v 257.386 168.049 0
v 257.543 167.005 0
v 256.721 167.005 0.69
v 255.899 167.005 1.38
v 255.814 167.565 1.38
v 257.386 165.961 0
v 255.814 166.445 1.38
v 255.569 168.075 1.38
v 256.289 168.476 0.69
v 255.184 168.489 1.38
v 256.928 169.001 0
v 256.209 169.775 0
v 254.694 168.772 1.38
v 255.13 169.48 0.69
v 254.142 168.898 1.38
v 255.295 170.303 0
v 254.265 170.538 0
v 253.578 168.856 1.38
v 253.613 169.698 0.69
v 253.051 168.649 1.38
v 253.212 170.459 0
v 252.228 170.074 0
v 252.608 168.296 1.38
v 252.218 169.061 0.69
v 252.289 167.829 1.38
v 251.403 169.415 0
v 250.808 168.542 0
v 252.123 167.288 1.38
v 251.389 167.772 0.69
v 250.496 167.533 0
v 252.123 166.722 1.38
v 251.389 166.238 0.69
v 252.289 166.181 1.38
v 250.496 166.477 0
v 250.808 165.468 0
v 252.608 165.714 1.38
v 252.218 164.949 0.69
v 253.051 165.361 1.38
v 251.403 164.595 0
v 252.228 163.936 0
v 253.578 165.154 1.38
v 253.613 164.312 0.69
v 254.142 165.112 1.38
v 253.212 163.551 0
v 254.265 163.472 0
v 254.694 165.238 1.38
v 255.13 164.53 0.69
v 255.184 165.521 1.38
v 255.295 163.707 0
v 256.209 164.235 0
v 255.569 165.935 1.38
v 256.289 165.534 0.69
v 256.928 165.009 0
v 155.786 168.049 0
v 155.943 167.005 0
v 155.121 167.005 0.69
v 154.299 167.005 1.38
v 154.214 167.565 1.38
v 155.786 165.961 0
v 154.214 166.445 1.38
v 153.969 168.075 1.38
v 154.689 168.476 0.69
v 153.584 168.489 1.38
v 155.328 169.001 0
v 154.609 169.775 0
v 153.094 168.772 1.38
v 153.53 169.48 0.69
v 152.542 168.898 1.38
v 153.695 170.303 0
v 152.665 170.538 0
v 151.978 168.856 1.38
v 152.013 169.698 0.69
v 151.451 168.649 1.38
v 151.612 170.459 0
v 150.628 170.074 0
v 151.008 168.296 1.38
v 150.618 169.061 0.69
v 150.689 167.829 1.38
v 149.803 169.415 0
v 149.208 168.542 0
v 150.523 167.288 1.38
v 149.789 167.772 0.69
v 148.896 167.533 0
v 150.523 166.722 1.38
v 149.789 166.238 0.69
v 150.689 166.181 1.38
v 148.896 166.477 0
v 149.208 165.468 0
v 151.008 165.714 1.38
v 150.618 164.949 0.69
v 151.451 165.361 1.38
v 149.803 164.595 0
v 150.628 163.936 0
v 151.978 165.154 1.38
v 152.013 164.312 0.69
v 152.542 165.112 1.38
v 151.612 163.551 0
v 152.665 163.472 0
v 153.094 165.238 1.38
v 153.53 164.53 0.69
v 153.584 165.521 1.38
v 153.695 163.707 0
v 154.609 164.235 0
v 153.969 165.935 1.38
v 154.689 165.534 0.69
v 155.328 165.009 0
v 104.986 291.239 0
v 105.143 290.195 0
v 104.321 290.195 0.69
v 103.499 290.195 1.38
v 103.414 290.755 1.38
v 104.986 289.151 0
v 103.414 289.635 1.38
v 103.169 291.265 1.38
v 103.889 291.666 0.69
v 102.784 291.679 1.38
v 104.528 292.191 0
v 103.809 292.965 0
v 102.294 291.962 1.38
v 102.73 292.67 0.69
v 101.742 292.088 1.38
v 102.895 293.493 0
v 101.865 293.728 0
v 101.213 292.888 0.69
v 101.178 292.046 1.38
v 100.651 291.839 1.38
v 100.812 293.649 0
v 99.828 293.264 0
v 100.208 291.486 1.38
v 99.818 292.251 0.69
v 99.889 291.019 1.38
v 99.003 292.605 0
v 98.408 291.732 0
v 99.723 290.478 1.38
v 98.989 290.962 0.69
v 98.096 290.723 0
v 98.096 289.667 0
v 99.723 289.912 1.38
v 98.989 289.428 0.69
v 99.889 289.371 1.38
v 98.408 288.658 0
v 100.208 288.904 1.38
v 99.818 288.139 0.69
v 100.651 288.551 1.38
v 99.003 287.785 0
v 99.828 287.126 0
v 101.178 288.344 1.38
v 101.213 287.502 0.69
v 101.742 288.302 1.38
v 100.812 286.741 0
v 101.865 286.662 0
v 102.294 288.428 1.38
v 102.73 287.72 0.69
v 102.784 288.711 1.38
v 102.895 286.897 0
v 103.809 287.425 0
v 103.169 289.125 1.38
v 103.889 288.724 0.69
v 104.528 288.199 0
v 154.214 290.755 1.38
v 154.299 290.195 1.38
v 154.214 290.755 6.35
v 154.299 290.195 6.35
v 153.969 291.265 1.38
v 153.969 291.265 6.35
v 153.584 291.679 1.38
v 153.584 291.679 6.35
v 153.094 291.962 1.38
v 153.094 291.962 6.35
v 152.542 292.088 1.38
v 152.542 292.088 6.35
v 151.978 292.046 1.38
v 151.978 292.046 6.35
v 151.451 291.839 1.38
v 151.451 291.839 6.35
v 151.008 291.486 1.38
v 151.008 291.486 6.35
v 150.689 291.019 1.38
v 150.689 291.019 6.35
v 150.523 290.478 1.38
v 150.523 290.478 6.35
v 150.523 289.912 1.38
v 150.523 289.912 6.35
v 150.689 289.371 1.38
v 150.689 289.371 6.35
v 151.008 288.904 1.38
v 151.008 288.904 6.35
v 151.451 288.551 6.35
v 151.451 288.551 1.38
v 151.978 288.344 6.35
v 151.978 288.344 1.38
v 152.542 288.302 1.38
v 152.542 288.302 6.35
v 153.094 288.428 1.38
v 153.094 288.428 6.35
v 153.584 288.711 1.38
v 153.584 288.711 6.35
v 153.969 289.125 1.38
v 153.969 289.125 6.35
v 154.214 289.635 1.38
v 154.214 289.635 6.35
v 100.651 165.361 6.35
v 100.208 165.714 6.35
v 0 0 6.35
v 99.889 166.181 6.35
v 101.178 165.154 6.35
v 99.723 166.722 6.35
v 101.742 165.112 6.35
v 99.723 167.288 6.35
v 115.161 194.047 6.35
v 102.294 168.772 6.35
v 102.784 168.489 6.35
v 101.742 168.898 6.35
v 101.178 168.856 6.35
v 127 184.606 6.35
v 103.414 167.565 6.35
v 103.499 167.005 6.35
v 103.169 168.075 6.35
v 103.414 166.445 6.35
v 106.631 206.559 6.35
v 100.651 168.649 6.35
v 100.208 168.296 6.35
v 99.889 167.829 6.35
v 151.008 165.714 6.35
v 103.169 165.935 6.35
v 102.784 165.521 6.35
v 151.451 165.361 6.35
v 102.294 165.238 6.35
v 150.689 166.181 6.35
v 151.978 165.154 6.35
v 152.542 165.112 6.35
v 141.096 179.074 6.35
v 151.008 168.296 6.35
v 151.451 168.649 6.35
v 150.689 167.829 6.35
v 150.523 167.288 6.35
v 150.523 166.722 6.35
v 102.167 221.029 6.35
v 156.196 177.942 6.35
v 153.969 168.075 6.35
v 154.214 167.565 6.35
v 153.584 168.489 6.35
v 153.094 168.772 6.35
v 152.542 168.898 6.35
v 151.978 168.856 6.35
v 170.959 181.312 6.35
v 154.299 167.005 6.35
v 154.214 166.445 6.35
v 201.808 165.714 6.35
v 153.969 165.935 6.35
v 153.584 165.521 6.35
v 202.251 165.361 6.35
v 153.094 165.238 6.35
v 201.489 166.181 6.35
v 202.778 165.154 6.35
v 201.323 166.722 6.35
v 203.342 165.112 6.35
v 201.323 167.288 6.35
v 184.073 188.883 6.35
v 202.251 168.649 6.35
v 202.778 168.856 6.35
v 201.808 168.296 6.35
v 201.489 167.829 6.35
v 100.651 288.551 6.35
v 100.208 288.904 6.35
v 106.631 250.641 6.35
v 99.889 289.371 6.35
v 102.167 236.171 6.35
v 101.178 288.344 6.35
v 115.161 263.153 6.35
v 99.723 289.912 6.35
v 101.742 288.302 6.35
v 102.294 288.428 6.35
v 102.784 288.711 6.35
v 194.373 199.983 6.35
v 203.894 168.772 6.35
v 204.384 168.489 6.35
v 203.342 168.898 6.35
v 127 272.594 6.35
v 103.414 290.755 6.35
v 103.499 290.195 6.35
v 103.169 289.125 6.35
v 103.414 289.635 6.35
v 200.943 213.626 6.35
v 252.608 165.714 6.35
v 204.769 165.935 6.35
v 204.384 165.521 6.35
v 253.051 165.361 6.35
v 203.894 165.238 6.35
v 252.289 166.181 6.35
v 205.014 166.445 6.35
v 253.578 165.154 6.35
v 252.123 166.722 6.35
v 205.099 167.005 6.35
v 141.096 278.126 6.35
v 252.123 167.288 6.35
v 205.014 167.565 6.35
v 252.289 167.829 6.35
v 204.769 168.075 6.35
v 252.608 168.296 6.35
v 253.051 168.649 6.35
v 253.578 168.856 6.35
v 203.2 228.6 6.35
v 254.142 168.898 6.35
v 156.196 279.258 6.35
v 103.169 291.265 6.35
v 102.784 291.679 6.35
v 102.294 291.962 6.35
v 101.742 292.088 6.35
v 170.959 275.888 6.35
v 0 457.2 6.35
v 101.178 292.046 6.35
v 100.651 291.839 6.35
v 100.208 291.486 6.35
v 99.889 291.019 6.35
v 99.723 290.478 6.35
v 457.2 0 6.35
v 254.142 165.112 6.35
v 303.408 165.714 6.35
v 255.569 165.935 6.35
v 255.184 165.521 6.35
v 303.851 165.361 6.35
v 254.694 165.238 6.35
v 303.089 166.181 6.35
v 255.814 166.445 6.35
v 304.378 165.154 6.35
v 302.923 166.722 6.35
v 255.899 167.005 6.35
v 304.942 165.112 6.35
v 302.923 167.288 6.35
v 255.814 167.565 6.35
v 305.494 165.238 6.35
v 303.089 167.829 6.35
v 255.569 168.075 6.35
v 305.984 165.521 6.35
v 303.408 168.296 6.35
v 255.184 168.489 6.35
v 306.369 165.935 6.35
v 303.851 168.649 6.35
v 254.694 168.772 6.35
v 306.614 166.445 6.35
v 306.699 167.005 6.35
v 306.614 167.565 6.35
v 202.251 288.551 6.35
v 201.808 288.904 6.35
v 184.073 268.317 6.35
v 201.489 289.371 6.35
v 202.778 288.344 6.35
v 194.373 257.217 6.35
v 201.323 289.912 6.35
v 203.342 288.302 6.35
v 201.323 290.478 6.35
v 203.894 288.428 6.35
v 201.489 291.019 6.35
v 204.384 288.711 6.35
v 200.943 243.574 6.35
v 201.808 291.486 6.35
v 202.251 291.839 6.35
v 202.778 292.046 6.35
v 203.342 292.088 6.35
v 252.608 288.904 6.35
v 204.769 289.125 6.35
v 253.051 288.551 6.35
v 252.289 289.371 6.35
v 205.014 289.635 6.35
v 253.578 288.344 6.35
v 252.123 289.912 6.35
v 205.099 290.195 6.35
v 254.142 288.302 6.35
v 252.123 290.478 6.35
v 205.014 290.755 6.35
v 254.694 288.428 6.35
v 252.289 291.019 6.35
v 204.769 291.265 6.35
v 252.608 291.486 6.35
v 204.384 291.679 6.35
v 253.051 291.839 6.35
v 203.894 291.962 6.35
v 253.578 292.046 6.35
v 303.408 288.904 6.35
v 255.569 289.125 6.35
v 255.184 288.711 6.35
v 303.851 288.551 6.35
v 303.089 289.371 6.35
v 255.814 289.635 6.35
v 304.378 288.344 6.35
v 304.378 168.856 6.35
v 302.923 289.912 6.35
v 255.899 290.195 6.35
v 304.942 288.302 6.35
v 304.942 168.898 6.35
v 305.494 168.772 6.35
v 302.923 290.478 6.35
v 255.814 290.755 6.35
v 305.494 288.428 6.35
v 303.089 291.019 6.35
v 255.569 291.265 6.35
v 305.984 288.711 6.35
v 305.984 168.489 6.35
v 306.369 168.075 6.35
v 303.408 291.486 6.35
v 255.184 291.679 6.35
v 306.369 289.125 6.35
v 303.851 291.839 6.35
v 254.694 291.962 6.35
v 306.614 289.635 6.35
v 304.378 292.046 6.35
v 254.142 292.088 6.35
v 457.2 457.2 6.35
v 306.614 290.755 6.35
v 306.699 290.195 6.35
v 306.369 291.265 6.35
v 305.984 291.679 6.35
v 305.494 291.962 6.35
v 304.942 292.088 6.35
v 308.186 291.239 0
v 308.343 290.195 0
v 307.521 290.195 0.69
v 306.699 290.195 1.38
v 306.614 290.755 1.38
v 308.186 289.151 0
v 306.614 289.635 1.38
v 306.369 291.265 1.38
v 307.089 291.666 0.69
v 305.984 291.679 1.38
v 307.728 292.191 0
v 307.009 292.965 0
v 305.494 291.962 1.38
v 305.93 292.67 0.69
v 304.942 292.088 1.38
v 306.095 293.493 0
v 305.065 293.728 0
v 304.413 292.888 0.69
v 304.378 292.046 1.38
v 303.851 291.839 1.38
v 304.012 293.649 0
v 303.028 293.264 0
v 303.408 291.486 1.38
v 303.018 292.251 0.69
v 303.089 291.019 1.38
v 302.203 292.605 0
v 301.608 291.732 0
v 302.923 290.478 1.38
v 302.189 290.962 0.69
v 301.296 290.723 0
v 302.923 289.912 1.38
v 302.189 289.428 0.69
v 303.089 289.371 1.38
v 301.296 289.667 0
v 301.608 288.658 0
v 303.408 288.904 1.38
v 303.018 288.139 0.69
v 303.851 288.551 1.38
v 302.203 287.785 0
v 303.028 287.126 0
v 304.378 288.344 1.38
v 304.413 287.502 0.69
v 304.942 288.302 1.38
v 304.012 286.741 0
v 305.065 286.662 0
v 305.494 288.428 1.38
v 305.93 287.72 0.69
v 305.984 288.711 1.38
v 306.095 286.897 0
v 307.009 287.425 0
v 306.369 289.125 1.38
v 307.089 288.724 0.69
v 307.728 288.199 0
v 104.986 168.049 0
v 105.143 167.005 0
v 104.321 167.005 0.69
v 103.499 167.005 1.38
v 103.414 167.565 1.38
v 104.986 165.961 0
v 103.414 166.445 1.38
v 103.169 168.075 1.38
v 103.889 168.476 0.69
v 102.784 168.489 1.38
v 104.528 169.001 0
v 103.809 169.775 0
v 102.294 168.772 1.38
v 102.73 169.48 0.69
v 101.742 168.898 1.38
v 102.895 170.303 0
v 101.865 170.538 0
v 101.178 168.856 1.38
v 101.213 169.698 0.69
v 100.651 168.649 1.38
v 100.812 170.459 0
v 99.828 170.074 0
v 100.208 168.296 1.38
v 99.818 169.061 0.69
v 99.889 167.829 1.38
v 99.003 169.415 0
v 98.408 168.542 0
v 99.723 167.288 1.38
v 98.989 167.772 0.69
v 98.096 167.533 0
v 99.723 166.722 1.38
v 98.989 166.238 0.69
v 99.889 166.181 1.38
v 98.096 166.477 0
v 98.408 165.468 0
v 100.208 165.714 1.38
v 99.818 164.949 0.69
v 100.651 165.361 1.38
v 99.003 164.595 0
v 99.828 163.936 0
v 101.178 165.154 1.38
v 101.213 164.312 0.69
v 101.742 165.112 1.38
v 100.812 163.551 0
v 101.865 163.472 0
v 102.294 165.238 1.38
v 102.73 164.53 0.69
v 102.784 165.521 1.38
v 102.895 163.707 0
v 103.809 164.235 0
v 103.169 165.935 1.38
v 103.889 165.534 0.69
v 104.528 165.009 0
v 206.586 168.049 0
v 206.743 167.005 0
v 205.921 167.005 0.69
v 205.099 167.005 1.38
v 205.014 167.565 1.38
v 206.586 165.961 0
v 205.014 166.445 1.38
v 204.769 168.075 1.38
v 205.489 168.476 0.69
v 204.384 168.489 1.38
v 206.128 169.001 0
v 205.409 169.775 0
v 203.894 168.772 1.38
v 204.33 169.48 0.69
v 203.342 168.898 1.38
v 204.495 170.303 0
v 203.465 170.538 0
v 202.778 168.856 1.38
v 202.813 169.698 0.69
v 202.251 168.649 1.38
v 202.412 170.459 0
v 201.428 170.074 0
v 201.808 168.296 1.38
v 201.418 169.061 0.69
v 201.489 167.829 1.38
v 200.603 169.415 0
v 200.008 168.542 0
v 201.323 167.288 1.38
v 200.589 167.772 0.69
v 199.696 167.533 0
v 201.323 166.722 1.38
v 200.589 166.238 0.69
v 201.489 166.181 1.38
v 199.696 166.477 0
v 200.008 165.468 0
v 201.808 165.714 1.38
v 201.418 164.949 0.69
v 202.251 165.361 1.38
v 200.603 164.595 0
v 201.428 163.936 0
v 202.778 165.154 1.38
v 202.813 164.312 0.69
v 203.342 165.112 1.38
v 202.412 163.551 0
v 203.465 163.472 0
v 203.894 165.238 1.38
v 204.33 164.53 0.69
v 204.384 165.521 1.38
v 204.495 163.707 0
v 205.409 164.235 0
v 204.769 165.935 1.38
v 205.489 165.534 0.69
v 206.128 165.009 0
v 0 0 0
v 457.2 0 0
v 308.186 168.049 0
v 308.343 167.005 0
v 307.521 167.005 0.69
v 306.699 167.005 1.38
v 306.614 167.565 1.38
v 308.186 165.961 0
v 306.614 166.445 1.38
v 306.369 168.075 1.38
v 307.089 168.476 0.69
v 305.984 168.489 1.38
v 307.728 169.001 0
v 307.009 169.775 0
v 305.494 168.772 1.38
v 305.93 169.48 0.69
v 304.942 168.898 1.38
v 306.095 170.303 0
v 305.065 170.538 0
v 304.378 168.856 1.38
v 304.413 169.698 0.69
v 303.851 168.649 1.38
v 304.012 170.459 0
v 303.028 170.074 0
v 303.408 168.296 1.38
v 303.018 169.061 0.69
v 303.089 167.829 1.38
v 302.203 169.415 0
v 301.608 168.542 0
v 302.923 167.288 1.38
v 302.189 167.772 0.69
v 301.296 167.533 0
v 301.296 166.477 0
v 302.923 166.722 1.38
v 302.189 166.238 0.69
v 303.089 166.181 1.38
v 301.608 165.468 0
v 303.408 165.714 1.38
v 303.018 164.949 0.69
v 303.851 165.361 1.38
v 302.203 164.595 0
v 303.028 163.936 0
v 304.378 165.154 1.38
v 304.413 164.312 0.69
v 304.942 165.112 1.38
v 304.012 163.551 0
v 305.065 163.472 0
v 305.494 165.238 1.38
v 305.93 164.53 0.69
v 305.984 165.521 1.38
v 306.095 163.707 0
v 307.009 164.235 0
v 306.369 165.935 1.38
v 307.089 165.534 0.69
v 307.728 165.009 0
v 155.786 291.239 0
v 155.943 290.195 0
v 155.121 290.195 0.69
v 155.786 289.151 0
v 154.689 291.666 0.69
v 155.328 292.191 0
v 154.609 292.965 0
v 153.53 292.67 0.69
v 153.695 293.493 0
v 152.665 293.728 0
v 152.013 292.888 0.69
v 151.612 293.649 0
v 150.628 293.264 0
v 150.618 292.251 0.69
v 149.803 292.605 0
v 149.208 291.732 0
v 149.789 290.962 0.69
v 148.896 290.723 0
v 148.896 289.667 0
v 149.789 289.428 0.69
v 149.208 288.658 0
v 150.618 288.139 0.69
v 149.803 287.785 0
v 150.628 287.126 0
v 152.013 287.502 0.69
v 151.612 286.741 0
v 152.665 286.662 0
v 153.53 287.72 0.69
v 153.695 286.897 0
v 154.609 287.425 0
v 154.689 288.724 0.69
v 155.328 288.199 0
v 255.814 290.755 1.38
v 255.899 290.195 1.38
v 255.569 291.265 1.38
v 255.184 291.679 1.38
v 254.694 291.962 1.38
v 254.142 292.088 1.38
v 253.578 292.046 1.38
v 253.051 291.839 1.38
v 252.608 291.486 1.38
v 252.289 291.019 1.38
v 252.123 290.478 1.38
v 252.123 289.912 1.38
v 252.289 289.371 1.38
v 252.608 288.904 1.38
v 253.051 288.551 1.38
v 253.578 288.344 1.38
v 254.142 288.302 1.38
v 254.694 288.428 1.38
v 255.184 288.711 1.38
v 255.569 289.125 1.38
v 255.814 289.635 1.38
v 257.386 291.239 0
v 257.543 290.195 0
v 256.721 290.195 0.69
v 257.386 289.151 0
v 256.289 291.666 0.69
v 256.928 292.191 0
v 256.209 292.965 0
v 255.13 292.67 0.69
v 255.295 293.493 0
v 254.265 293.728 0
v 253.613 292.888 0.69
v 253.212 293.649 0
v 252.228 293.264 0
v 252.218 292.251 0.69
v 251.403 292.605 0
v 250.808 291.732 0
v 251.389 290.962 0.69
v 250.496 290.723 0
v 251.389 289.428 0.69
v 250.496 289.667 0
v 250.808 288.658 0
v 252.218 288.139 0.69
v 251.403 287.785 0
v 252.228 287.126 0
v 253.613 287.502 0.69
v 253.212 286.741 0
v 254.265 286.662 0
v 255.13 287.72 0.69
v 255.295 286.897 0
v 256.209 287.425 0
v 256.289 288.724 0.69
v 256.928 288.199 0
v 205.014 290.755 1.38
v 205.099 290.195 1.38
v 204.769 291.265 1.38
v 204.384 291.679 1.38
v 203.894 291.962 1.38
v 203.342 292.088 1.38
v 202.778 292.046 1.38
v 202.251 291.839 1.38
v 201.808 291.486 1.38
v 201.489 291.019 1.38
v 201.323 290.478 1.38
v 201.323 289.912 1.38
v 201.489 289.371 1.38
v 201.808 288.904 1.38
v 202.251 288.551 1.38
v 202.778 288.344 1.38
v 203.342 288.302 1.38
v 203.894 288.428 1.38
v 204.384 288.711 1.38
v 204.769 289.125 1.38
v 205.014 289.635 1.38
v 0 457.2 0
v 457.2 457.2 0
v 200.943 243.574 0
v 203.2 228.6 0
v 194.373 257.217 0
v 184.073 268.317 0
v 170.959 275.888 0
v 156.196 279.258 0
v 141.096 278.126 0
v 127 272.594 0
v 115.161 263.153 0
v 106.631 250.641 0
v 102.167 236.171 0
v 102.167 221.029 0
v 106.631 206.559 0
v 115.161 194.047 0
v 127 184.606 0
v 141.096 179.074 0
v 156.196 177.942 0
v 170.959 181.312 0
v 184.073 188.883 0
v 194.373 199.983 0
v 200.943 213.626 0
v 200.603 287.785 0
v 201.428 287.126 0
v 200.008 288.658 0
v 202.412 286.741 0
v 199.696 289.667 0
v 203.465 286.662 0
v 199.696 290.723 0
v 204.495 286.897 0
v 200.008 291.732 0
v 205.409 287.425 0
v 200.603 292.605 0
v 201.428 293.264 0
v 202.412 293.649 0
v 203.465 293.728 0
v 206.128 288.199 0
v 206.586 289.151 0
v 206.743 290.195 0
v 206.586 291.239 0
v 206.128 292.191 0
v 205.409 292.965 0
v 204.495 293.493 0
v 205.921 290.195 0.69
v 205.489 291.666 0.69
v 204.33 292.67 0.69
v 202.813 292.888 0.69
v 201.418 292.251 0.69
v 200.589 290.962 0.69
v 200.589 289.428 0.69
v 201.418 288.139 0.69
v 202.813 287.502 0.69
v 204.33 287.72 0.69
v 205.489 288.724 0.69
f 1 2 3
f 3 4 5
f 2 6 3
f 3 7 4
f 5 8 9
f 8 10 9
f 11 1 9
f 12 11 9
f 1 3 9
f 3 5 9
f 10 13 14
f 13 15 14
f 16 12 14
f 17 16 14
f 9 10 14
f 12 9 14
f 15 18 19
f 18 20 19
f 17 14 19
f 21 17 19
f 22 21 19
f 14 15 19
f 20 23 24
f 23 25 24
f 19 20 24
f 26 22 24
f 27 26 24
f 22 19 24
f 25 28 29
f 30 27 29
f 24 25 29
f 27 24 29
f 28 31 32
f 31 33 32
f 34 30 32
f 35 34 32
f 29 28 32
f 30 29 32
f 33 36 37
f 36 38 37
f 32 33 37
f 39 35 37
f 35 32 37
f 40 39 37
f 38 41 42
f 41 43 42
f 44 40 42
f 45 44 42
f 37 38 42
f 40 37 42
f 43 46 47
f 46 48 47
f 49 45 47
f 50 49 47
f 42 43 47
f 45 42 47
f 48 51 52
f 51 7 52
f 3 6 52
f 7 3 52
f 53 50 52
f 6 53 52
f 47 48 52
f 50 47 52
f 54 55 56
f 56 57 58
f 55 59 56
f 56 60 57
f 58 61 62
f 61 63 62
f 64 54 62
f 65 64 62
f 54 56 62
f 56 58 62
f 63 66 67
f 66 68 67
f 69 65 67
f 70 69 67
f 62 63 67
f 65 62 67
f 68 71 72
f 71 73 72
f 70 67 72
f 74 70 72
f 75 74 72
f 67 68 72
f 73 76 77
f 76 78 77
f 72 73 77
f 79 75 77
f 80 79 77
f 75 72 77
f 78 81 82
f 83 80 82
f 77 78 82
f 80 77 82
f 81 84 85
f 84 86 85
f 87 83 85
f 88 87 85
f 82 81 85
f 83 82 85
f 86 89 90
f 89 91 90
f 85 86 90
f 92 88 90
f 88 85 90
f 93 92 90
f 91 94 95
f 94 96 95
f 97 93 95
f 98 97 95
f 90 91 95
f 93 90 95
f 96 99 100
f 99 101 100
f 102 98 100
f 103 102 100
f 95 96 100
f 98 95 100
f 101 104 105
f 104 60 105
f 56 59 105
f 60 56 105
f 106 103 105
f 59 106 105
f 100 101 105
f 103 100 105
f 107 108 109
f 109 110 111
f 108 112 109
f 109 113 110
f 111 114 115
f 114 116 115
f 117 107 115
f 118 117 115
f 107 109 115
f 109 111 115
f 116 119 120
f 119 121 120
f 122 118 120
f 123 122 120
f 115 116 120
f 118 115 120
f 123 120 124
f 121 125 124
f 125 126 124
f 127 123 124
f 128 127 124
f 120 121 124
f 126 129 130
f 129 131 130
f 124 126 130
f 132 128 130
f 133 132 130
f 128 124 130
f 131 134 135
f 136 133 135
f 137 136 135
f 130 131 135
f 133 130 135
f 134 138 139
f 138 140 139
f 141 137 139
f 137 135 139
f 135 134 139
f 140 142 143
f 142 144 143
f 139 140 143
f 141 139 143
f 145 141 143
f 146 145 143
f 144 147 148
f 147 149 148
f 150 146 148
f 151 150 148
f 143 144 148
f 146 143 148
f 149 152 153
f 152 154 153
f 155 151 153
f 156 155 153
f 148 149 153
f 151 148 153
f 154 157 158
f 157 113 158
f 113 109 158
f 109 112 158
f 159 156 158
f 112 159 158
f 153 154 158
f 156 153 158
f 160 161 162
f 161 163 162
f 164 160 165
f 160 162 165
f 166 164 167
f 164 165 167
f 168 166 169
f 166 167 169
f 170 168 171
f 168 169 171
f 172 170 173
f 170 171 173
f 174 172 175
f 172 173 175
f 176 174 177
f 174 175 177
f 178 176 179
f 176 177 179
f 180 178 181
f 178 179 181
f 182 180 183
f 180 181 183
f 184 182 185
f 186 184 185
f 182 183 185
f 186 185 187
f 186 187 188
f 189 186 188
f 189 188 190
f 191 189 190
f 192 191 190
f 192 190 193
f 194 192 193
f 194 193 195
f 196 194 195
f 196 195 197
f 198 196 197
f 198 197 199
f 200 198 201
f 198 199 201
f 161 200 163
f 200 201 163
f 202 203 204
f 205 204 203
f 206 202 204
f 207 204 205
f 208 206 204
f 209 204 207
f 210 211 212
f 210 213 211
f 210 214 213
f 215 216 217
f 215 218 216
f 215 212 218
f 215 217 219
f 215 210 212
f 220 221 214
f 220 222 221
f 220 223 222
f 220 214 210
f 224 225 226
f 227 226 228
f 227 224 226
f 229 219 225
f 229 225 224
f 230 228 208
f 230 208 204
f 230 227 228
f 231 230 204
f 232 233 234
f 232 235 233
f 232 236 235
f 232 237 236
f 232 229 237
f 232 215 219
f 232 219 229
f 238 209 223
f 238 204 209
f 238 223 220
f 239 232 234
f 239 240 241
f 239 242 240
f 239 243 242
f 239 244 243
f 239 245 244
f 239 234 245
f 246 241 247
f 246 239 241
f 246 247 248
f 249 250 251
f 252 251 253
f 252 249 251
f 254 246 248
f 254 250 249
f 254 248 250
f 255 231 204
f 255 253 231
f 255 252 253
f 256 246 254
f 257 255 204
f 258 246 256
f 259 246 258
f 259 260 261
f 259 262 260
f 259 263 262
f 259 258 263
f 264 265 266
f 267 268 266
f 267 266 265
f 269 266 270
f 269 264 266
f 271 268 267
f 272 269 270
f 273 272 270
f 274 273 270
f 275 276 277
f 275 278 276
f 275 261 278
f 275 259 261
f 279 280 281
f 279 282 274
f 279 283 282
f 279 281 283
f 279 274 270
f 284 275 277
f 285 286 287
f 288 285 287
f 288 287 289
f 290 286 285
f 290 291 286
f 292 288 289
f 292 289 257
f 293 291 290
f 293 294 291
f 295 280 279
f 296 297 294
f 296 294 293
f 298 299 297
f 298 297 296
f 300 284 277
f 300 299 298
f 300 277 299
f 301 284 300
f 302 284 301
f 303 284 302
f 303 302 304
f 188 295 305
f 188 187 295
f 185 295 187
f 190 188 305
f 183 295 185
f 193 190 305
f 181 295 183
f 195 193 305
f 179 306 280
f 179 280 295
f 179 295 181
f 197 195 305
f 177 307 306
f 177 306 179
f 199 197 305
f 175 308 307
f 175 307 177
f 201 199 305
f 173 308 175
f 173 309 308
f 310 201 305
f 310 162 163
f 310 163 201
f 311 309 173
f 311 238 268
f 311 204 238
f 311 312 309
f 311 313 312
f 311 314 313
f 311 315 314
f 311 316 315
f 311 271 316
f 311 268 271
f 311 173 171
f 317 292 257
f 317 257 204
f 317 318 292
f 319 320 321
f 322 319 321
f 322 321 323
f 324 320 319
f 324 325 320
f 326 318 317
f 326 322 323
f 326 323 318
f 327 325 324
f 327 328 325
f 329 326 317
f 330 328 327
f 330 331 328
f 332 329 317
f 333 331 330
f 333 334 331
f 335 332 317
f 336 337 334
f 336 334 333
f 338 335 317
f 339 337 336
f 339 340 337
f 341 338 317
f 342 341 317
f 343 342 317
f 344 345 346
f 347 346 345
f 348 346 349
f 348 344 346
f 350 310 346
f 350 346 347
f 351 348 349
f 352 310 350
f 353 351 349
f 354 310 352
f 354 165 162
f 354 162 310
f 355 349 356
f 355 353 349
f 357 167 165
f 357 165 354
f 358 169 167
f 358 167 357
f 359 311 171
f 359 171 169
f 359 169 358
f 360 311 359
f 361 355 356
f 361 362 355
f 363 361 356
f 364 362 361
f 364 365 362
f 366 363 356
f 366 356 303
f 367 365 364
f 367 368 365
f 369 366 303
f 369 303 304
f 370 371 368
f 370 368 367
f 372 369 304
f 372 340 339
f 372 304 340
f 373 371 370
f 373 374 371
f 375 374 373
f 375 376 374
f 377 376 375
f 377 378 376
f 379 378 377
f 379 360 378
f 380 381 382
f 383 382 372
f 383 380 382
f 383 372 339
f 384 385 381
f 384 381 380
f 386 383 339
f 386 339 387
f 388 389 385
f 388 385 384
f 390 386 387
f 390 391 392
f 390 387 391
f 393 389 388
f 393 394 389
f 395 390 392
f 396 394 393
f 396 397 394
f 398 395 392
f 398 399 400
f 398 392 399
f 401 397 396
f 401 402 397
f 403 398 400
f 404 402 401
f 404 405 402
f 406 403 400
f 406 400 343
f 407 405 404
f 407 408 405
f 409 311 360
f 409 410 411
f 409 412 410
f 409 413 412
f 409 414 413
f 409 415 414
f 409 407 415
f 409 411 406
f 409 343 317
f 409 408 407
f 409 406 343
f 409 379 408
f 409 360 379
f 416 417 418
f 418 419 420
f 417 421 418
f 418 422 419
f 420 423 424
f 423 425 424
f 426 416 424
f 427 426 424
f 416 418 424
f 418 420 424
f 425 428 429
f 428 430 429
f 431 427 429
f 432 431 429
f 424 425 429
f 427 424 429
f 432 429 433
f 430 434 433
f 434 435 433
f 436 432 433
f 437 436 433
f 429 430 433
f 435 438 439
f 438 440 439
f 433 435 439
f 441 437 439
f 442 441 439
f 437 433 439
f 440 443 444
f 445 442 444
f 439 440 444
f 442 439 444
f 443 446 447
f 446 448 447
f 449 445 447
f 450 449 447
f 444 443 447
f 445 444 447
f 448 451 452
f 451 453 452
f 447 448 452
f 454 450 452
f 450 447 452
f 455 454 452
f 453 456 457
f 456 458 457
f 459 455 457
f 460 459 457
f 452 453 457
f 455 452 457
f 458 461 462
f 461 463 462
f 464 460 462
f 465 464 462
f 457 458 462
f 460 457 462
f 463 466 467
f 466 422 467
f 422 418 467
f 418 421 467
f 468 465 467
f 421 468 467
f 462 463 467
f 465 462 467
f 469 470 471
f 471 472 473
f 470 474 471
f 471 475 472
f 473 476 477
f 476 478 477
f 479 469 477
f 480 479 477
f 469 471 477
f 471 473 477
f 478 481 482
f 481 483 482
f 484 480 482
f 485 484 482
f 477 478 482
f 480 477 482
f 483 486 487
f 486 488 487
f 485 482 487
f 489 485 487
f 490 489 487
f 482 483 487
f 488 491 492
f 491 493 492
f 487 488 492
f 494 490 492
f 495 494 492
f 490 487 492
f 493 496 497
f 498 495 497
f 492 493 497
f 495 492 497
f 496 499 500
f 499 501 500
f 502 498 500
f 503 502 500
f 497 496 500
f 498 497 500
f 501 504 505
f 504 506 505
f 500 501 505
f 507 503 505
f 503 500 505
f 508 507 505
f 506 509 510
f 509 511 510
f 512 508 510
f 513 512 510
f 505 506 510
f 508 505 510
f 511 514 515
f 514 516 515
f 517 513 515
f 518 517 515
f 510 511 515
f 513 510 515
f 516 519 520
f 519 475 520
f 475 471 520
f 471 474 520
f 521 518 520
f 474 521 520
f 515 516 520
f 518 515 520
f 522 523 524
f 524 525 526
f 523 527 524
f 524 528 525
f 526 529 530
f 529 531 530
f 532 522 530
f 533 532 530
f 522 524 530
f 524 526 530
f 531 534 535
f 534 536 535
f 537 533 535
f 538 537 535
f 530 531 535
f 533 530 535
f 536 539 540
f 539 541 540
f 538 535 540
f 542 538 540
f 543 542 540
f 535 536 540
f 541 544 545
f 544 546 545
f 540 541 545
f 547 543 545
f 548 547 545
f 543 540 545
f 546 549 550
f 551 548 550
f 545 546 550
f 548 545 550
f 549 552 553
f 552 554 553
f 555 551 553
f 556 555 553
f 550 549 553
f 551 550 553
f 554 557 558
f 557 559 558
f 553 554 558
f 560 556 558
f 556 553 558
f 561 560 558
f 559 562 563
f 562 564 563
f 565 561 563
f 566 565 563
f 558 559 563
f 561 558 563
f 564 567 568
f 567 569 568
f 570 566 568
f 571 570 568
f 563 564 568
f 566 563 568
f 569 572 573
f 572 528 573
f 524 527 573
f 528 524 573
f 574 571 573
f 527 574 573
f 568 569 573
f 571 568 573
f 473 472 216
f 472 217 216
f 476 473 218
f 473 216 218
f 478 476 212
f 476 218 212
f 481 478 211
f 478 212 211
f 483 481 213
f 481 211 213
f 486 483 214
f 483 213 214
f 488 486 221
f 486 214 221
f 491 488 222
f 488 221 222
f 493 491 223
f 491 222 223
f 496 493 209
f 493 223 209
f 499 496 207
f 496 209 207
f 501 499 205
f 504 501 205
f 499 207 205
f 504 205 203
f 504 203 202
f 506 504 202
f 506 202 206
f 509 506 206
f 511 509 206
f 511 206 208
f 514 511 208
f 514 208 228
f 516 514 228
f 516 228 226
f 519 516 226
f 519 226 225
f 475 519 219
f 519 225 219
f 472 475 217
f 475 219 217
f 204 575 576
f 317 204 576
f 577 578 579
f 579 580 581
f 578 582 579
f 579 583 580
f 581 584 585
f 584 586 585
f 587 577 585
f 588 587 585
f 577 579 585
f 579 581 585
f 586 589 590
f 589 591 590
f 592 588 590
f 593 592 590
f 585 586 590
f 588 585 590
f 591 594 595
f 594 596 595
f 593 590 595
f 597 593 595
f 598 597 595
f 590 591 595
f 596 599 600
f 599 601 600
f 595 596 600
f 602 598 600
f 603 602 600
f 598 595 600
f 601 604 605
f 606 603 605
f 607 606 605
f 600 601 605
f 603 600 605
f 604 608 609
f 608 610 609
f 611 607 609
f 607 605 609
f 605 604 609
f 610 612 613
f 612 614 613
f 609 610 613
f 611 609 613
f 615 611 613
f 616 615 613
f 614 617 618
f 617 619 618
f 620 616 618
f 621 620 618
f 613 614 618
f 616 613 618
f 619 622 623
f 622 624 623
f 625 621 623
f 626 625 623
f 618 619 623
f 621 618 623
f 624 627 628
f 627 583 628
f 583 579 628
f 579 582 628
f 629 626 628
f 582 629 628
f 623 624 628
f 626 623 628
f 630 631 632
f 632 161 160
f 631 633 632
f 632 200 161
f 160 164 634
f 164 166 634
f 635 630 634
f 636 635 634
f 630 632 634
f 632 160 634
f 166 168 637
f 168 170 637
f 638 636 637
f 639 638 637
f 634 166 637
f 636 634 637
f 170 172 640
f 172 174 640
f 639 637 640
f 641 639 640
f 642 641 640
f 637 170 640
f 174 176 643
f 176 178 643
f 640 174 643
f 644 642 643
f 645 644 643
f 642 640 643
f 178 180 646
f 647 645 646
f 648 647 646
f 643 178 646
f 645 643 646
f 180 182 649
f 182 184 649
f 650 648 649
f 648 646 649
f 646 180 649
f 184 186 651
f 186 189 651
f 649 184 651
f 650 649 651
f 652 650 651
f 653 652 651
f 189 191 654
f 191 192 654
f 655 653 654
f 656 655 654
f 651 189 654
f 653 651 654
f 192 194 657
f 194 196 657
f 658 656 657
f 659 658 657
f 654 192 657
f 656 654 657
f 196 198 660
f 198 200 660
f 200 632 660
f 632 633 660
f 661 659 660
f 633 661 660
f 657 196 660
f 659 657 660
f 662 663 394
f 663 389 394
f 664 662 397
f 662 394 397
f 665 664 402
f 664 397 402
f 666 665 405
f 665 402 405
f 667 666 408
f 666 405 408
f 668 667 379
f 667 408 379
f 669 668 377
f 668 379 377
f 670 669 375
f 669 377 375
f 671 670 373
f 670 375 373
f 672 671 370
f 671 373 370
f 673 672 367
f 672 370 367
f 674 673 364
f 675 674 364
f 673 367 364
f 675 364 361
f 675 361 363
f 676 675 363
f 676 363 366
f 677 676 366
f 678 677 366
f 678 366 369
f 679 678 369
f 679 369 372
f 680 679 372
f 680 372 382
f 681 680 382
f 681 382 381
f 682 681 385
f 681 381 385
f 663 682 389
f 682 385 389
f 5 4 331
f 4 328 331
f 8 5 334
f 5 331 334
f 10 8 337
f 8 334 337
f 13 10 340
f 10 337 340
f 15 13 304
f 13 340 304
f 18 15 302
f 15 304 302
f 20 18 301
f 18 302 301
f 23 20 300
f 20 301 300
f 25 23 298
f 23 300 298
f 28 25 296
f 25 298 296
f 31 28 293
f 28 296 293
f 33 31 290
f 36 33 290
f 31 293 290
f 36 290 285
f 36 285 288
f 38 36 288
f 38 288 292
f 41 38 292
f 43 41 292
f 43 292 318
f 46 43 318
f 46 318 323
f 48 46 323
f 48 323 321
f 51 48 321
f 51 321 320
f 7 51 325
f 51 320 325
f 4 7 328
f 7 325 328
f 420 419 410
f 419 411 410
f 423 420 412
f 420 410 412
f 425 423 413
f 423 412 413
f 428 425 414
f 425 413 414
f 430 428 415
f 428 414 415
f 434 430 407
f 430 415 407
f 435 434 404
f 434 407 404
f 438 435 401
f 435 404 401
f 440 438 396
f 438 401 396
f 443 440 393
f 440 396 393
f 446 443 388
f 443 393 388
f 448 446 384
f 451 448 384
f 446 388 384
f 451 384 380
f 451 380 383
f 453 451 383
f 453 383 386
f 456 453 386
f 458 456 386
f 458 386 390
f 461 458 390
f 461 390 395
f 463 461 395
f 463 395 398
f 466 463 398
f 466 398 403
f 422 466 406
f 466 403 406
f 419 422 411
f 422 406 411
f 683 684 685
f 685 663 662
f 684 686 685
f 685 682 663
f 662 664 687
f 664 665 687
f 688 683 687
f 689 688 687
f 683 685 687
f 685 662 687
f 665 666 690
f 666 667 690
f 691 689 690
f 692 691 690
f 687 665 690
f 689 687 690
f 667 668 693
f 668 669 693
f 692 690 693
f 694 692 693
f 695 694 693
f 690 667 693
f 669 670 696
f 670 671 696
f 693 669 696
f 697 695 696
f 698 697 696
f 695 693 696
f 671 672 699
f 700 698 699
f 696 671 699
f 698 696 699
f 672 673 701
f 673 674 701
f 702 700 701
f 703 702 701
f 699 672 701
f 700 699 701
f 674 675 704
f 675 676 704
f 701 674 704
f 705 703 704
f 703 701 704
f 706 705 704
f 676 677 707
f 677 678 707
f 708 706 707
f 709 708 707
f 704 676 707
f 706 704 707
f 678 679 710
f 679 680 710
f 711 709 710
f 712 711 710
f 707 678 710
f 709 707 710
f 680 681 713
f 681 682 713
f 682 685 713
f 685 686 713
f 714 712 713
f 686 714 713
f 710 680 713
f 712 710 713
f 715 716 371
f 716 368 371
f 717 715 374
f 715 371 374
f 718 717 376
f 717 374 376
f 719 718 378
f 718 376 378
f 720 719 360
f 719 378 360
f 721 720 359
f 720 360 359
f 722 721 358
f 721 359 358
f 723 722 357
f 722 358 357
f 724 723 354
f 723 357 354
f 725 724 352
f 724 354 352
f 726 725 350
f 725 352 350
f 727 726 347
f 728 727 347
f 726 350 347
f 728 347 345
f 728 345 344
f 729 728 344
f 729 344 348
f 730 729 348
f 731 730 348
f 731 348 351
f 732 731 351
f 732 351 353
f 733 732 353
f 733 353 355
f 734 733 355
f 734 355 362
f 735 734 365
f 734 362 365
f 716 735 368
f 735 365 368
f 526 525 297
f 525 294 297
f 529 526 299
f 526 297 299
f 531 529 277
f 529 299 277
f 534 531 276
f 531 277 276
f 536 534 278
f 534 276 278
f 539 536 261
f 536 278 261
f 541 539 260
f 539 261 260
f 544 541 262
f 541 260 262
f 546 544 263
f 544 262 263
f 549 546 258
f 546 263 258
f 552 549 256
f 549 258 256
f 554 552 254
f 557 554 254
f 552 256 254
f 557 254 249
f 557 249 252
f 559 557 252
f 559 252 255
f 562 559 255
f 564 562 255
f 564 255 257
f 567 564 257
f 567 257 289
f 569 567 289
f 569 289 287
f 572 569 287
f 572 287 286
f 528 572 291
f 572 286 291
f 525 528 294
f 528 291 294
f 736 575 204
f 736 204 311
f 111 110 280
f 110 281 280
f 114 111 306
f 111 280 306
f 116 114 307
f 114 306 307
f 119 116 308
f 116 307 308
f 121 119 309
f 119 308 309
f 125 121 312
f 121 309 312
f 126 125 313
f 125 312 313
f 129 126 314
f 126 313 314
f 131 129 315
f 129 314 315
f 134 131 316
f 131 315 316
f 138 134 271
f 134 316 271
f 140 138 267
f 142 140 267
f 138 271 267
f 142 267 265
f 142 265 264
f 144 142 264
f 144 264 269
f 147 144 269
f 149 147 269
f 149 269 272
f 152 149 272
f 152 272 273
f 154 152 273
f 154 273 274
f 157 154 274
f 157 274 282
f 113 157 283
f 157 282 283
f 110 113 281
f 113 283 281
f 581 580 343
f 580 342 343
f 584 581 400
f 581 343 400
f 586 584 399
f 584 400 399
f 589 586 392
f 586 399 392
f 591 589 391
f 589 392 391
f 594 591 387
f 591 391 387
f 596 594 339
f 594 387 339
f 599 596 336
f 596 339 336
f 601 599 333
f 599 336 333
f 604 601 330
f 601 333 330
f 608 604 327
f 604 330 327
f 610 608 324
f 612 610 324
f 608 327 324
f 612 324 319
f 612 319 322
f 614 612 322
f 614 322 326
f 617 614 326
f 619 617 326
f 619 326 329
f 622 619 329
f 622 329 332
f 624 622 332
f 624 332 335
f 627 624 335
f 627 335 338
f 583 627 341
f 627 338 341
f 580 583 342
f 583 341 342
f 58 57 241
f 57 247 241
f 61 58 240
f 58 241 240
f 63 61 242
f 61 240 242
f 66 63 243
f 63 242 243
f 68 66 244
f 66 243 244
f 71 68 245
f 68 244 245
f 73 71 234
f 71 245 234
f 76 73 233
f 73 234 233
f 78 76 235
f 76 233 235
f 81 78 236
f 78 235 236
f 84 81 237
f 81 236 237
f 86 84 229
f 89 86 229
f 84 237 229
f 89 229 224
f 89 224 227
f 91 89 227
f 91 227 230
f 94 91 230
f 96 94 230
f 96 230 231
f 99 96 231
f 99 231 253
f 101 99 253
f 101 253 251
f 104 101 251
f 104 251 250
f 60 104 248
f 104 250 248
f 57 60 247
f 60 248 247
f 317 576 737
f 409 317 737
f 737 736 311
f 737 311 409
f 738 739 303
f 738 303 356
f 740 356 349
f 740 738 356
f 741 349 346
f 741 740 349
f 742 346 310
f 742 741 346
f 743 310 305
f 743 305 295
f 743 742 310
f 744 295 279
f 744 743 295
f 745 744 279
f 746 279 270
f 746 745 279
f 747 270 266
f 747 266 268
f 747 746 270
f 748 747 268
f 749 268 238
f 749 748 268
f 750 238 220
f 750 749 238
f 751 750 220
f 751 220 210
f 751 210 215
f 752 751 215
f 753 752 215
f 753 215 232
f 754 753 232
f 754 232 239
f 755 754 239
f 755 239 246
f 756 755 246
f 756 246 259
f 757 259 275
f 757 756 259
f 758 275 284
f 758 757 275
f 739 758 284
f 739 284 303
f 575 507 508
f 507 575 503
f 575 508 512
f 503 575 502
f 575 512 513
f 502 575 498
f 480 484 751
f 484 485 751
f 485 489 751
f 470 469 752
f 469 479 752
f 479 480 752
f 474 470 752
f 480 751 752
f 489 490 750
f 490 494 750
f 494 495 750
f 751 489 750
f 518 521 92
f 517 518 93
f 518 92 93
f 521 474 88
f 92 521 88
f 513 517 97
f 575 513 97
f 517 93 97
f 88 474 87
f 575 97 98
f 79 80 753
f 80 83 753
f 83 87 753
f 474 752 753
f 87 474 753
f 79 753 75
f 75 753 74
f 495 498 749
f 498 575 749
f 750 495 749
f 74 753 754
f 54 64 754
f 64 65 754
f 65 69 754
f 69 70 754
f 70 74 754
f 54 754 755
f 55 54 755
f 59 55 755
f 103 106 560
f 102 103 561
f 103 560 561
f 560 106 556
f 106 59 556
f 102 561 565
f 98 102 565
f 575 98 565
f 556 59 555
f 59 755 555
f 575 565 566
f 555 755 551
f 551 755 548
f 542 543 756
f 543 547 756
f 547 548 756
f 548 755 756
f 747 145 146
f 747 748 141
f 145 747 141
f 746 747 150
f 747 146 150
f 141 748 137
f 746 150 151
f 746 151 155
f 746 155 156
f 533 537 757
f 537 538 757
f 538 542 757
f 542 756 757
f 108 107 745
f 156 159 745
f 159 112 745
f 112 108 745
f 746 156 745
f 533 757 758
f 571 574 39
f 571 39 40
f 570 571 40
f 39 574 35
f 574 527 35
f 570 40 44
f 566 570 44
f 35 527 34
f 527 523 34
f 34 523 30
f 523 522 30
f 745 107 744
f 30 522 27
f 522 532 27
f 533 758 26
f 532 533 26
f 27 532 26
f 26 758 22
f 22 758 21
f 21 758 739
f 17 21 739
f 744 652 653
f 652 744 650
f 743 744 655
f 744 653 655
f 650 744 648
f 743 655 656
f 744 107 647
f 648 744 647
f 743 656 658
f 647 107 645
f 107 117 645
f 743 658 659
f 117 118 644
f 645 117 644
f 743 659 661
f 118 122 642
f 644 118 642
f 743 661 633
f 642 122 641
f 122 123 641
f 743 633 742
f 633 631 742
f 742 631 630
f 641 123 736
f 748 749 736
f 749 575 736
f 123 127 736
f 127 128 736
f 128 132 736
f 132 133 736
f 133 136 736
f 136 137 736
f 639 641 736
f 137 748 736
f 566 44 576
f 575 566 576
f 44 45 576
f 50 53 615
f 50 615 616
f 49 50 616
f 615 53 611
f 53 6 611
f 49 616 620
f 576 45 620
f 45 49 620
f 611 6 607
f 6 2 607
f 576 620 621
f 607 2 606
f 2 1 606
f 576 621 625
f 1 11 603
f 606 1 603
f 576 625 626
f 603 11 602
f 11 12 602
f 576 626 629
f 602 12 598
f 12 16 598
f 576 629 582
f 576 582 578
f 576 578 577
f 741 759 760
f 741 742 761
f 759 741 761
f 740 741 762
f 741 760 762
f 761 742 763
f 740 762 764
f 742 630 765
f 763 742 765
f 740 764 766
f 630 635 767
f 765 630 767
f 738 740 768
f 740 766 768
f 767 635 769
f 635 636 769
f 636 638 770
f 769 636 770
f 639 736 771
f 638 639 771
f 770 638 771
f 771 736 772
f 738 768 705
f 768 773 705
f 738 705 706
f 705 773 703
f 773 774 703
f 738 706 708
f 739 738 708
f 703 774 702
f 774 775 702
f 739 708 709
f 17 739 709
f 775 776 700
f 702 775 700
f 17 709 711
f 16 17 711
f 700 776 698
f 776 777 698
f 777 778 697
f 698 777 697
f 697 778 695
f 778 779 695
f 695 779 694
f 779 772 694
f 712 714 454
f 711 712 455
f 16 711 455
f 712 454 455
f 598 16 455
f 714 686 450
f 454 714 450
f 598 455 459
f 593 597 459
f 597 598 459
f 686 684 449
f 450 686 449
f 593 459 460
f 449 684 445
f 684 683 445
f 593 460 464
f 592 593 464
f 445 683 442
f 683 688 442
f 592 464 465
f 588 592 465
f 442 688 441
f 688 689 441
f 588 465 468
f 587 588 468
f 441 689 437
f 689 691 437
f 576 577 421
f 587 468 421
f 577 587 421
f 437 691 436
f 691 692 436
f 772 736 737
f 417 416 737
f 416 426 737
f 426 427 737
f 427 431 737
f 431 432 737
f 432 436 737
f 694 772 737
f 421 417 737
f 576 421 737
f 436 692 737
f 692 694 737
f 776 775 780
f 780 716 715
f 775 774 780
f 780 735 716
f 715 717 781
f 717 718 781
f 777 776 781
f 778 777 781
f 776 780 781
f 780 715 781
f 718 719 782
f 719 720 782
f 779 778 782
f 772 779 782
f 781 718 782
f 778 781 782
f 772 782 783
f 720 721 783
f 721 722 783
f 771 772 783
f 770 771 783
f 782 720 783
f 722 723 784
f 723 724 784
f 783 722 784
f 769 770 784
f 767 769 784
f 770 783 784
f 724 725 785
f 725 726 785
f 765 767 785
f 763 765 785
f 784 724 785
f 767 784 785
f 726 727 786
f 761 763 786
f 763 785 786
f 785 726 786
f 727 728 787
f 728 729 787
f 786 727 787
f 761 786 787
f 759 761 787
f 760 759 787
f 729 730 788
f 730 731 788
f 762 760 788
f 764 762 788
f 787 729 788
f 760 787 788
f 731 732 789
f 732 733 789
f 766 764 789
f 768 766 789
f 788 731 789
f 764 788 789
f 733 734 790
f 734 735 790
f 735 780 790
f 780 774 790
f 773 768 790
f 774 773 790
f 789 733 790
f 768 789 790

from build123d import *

# Parameters (mm, degrees)
SKETCH1_W                                         = 457.2
SKETCH1_H                                         = 457.2
SKETCH1_R                                         = 50.8
BOSS_EXTRUDE1_DEPTH                               = 6.35
CSK_FOR_6_FLAT_HEAD_MACHINE_SCREW_100_D           = 3.7973
CSK_FOR_6_FLAT_HEAD_MACHINE_SCREW_100_CSINK_D     = 7.0866
CSK_FOR_6_FLAT_HEAD_MACHINE_SCREW_100_CSINK_ANGLE = 100


with BuildPart() as part:
    # Sketch1 → Boss-Extrude1 (new body)
    with BuildSketch(Plane.XY):
        with Locations((228.6, 228.6)):
            Rectangle(SKETCH1_W, SKETCH1_H)
        with Locations((152.4, 228.6)):
            Circle(SKETCH1_R, mode=Mode.SUBTRACT)
    extrude(amount=BOSS_EXTRUDE1_DEPTH)

    # CSK for #6 Flat Head Machine Screw (100)1 (through all)
    with Locations(Plane(origin=(0, 0, 0), x_dir=(-1, 0, 0), z_dir=(0, 0, -1))):
        with Locations((-101.6, 290.195), (-152.4, 290.195), (-203.2, 290.195), (-203.2, 167.005), (-152.4, 167.005), (-101.6, 167.005), (-254, 290.195), (-304.8, 290.195), (-304.8, 167.005), (-254, 167.005)):
            CounterSinkHole(CSK_FOR_6_FLAT_HEAD_MACHINE_SCREW_100_D / 2, CSK_FOR_6_FLAT_HEAD_MACHINE_SCREW_100_CSINK_D / 2, counter_sink_angle=CSK_FOR_6_FLAT_HEAD_MACHINE_SCREW_100_CSINK_ANGLE)


solid = part.part
